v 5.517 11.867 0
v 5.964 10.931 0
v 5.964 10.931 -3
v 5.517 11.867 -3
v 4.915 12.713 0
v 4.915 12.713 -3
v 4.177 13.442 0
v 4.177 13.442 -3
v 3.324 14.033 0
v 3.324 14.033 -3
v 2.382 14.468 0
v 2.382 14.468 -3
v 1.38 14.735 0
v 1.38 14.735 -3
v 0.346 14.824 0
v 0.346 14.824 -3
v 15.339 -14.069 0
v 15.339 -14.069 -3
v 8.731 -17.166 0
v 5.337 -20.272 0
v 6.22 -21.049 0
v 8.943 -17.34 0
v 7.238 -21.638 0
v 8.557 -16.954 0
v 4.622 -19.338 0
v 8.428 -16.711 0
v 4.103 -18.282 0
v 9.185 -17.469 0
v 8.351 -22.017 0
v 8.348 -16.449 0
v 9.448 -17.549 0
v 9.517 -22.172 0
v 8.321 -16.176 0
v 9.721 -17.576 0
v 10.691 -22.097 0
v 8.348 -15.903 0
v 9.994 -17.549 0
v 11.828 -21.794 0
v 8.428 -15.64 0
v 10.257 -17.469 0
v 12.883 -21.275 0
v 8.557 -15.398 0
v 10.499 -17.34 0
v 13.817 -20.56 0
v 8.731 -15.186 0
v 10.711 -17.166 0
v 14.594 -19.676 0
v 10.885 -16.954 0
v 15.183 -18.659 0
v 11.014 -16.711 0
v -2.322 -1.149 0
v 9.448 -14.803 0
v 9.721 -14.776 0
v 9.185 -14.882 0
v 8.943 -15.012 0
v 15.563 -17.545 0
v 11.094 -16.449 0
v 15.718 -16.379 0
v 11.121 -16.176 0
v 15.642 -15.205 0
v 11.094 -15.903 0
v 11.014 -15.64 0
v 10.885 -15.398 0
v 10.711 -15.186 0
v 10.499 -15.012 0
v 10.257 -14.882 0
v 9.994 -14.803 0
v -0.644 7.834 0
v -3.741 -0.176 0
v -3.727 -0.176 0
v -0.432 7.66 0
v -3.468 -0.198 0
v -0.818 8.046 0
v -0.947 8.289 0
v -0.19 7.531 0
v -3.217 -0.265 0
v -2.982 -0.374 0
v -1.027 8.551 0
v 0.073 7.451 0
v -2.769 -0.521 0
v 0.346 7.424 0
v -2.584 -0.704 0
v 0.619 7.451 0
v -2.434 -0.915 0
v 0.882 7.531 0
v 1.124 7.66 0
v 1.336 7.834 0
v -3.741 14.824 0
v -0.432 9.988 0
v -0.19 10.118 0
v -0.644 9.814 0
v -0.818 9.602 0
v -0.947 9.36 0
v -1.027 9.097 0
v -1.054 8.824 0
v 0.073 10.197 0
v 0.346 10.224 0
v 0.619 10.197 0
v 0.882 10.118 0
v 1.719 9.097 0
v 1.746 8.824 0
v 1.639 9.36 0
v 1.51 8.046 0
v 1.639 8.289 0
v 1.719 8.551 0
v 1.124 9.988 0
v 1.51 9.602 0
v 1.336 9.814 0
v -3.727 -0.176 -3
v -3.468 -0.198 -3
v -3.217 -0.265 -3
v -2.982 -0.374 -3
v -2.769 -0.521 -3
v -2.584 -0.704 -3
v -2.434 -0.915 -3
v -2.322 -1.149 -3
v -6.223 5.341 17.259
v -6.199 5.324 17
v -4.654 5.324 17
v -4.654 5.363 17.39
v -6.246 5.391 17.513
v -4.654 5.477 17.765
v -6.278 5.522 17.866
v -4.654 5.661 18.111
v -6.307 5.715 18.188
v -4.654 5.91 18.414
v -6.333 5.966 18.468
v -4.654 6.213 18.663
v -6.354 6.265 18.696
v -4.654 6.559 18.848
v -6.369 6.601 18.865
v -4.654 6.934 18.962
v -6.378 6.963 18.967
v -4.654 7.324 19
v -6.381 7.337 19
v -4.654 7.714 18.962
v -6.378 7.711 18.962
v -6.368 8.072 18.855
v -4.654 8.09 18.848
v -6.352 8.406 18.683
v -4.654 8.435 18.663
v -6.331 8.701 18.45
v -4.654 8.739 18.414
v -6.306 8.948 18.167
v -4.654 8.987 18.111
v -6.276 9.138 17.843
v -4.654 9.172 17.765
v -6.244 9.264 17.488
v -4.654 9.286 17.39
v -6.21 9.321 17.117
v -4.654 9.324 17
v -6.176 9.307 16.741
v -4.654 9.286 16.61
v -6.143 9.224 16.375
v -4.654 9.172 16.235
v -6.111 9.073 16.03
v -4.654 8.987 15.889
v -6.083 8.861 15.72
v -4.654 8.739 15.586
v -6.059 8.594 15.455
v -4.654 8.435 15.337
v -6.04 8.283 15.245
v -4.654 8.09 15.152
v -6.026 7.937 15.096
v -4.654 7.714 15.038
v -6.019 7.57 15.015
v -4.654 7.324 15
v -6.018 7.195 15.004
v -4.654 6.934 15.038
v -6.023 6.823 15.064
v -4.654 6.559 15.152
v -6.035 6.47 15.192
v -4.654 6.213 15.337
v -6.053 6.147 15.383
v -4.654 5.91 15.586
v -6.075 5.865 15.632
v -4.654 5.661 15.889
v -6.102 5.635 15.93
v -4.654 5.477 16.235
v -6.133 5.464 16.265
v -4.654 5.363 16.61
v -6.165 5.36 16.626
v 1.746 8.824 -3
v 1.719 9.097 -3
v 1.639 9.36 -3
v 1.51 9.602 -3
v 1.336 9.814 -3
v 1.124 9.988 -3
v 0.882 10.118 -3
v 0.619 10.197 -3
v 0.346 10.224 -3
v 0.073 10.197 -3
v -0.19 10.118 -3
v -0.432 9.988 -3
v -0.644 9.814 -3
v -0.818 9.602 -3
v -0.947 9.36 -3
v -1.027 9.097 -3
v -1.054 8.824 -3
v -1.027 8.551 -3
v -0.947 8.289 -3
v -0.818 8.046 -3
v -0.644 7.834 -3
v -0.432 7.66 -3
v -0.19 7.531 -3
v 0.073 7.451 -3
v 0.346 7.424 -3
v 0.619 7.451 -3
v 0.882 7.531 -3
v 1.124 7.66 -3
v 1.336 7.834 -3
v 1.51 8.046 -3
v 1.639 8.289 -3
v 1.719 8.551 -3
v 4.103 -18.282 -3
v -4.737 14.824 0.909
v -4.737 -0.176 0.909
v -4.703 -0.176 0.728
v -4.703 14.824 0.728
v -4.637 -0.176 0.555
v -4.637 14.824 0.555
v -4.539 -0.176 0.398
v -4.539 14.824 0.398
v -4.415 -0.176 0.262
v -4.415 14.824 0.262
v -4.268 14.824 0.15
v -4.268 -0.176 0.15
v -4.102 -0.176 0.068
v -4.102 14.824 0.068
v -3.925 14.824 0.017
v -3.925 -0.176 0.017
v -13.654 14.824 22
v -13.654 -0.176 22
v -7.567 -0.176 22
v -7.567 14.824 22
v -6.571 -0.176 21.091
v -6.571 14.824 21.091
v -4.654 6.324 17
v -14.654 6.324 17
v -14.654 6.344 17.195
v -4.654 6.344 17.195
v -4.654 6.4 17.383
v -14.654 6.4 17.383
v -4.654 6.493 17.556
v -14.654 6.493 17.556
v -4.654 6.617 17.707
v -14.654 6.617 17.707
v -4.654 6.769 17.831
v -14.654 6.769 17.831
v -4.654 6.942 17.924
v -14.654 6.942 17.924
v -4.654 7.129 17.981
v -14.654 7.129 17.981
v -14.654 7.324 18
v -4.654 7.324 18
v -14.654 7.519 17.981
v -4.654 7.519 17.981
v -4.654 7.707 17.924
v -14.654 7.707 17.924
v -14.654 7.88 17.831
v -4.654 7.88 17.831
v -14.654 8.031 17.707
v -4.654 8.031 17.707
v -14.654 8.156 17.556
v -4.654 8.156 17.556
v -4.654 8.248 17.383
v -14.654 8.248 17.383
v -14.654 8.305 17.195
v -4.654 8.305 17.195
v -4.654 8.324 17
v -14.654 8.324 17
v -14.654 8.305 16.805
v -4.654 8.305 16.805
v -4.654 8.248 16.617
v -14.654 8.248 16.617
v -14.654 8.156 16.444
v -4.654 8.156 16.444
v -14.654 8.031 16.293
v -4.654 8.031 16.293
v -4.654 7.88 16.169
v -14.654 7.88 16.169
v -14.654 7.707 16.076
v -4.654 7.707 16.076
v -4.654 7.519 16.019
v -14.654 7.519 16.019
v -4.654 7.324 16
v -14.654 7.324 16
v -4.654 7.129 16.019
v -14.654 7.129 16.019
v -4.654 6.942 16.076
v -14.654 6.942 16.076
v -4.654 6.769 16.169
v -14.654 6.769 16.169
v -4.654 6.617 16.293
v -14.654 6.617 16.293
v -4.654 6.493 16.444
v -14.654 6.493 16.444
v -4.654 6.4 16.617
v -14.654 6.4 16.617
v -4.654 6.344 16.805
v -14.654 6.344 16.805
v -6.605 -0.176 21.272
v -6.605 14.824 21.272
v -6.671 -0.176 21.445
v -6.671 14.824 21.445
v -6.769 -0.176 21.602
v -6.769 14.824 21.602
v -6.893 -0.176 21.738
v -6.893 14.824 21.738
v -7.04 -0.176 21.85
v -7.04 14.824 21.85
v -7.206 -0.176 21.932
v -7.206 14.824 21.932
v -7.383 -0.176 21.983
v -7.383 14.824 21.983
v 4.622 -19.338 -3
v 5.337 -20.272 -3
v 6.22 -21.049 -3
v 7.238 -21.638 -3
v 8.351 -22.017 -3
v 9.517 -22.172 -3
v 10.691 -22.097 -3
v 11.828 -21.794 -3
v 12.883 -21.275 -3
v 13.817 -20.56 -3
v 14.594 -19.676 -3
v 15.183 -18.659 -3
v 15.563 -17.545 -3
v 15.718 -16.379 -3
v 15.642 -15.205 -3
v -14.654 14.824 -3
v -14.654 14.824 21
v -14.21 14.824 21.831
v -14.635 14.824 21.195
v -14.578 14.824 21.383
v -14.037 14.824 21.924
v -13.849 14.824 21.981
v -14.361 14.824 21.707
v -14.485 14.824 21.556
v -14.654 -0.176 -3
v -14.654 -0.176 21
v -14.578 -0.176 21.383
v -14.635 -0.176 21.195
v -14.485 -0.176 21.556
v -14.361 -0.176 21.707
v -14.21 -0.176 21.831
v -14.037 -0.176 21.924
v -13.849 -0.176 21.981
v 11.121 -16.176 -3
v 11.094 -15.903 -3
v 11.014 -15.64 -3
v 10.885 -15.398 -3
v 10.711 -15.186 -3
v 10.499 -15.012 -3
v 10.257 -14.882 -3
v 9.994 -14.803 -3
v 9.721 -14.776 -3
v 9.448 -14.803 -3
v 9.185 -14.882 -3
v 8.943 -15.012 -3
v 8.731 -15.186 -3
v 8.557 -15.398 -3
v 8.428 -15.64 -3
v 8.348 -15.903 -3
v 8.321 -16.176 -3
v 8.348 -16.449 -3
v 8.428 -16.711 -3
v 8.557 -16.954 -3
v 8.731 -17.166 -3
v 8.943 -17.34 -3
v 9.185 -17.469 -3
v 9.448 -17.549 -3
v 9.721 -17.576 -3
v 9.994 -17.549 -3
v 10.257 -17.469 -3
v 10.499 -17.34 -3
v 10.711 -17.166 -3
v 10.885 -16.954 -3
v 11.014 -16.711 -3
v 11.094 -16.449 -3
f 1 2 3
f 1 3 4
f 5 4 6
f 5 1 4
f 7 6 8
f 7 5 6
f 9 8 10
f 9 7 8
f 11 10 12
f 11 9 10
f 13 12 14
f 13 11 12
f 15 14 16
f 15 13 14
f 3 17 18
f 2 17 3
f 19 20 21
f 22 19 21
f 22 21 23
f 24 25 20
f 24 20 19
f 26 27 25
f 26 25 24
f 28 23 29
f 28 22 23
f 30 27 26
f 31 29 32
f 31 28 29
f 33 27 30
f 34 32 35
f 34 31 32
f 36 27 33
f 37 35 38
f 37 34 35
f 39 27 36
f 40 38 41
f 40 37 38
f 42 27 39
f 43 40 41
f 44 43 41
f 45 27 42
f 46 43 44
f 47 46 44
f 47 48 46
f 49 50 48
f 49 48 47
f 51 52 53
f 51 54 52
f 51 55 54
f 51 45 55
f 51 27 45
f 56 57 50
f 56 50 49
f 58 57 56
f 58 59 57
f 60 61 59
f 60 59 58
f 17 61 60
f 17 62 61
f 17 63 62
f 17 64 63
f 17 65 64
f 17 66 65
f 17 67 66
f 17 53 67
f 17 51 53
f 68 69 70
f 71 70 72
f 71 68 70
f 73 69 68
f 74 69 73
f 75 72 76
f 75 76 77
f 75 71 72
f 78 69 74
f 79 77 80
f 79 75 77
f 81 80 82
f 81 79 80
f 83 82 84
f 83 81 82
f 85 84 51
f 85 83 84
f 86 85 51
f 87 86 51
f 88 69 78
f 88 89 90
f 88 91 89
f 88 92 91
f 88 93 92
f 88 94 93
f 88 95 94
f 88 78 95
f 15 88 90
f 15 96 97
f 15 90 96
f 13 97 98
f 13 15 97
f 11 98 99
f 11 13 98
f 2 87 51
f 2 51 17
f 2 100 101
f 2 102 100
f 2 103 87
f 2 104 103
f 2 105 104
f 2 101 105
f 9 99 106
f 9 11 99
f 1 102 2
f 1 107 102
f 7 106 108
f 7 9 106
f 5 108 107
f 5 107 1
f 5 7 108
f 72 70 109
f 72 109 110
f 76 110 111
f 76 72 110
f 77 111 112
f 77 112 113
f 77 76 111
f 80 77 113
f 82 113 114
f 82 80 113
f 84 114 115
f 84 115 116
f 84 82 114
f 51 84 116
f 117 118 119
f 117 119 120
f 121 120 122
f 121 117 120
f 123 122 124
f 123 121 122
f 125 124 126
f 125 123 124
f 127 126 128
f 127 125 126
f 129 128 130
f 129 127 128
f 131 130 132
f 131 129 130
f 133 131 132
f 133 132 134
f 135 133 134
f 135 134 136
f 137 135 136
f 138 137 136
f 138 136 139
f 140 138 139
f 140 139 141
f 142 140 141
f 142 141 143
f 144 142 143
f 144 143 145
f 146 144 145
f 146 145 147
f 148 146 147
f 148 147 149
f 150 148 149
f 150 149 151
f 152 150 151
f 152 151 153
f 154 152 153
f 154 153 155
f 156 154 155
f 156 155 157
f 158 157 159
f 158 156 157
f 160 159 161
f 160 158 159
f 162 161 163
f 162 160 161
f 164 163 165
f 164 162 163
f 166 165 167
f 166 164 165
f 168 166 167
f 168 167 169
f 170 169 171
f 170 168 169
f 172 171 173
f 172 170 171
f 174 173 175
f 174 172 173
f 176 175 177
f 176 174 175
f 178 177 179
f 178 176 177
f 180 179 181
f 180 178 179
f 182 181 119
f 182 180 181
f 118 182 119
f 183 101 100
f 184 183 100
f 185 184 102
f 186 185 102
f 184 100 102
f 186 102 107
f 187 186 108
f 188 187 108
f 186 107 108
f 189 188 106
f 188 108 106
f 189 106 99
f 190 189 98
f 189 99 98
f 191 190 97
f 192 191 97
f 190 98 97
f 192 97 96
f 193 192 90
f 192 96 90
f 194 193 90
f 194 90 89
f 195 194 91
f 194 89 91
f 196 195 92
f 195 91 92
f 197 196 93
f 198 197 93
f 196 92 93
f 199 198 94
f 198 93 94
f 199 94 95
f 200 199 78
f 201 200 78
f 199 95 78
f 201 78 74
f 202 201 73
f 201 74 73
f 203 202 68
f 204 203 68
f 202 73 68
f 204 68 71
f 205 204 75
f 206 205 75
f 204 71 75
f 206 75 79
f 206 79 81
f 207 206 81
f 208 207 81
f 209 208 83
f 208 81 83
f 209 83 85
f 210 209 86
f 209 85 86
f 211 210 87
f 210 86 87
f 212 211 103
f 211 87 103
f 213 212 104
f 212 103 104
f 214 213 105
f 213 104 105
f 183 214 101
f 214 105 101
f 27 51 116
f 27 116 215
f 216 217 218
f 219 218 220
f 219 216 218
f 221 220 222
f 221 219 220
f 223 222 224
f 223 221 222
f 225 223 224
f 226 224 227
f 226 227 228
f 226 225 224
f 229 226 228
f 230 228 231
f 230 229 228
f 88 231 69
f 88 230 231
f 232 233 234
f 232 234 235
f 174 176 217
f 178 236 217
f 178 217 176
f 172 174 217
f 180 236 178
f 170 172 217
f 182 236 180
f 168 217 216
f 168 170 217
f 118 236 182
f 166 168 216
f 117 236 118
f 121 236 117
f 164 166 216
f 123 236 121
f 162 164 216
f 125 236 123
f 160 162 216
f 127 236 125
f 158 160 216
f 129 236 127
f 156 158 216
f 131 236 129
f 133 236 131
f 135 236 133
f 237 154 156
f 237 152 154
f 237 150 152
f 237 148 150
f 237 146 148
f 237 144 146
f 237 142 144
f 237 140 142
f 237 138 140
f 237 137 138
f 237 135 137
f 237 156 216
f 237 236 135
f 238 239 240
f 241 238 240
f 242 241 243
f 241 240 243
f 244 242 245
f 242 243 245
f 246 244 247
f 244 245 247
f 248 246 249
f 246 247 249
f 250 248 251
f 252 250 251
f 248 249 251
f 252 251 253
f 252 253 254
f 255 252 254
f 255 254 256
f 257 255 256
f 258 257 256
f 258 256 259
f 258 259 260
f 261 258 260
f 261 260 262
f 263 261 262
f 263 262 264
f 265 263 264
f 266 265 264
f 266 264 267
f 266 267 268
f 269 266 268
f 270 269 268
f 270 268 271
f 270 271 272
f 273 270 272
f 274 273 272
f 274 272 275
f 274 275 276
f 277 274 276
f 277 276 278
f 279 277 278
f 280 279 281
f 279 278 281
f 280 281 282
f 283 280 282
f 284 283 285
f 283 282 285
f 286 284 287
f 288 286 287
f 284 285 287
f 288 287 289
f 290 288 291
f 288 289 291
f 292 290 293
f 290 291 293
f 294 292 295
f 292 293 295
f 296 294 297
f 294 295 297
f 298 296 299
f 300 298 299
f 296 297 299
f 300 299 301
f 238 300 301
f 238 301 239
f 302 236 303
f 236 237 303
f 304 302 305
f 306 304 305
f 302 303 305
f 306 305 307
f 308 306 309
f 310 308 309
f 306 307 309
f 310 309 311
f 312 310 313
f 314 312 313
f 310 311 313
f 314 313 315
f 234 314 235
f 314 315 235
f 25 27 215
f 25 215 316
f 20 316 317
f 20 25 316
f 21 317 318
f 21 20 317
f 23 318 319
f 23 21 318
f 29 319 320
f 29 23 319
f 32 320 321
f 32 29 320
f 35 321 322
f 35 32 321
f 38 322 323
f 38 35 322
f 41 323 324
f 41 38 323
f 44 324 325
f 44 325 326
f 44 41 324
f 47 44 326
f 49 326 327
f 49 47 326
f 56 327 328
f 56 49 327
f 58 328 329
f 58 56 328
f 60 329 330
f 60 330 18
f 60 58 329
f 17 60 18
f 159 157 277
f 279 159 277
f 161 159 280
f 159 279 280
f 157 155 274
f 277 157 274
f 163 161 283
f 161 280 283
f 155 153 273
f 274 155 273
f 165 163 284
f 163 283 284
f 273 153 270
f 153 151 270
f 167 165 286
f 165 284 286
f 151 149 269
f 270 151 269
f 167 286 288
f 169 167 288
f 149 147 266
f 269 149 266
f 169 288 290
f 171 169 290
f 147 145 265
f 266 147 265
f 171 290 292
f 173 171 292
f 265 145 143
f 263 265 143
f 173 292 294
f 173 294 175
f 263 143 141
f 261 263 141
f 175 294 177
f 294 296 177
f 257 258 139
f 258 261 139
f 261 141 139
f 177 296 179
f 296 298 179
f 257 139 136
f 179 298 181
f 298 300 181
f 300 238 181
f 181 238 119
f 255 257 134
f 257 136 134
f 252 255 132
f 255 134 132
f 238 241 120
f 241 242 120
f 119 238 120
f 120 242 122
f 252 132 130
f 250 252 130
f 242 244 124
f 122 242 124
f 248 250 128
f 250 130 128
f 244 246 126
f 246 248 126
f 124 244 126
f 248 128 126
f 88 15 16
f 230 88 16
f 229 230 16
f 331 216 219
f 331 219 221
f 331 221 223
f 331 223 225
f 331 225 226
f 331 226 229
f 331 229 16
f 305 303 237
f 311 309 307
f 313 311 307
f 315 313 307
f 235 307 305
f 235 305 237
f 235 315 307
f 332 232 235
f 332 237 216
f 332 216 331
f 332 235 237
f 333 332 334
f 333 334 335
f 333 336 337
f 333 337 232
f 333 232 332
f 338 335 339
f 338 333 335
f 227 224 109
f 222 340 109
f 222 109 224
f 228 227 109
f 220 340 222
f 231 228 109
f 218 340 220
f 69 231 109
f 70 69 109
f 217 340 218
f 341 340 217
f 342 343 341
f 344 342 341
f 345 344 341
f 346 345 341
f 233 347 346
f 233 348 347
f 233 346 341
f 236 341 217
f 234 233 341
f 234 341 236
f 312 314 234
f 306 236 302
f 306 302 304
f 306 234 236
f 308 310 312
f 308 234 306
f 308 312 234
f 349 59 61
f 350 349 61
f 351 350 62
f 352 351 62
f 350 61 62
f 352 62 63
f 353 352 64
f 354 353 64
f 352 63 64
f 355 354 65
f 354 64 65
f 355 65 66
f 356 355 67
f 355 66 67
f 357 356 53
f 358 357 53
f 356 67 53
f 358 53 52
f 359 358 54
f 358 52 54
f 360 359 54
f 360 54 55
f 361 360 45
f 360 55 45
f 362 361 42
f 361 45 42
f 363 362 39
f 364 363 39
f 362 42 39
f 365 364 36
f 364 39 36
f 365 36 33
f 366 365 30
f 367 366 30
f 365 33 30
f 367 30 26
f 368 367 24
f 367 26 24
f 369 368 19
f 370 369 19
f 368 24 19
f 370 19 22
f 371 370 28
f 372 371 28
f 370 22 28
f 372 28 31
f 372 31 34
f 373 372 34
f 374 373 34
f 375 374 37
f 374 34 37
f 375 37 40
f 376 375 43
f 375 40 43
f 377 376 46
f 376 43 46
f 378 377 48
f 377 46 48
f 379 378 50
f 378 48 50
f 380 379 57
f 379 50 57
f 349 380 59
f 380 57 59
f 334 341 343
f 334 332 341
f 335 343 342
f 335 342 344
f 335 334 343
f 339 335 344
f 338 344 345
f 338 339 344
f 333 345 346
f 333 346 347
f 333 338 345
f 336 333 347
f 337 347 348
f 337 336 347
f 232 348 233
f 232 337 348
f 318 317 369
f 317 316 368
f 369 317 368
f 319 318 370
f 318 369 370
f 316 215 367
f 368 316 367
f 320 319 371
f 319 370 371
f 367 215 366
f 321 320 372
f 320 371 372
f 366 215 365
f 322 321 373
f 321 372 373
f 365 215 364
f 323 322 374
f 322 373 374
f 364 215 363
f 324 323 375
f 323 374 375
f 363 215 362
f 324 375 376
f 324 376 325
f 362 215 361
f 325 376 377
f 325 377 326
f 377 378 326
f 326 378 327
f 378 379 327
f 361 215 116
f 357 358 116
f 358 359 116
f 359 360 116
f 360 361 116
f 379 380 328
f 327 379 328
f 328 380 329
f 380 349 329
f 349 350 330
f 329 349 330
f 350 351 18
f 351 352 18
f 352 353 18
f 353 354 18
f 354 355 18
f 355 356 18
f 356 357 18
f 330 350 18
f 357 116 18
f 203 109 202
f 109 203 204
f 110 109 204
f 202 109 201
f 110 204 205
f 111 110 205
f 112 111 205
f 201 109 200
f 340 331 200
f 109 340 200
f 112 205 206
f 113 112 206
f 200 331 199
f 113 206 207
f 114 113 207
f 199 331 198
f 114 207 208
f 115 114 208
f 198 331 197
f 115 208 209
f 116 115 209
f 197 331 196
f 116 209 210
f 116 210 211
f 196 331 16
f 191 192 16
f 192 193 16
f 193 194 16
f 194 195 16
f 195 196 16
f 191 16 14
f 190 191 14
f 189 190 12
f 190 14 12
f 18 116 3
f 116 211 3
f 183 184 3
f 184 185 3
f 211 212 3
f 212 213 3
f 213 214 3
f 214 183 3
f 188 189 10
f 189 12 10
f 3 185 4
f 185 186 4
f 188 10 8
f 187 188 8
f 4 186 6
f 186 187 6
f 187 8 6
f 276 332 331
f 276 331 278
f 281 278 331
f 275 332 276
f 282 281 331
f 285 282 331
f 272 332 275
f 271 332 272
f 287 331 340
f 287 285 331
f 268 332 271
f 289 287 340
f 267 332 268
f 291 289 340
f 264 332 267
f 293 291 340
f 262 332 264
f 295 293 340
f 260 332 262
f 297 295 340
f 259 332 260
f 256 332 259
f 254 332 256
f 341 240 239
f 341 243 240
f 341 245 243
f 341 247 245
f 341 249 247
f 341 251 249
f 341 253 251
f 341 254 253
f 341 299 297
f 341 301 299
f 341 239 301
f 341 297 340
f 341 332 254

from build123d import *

# Parameters (mm, degrees)
F0_R     = 1.4
F0_W     = 10
F0_H     = 15
F3_DEPTH = 3
F2_W     = 8
F2_H     = 15
F5_R     = 2
F5_R_2   = 1
F6_DEPTH = 10
F7_DEPTH = 15
F8_R     = 1


with BuildPart() as f3:
    # F0 (on Top) → F3 (new body)
    with BuildSketch(Plane.XY):
        with BuildLine():
            Line((-2.3220218662, -1.1490219488), (4.1030128133, -18.2824477607))
            ThreePointArc((4.1030128133, -18.2824477607), (11.8277285282, -21.7936821766), (15.3389629441, -14.0689664616))
            Line((15.3389629441, -14.0689664616), (5.9639629441, 10.9310335384))
            ThreePointArc((5.9639629441, 10.9310335384), (3.7635569052, 13.7558465942), (0.3459878787, 14.8242928889))
            Line((0.3459878787, 14.8242928889), (-4.6540121213, 14.8242928889))
            Line((-4.6540121213, 14.8242928889), (-4.6540121213, -0.1757071111))
            Line((-4.6540121213, -0.1757071111), (-3.7265156326, -0.1757071111))
            ThreePointArc((-3.7265156326, -0.1757071111), (-2.8721233759, -0.4428186848), (-2.3220218662, -1.1490219488))
        make_face()
        with Locations((9.7209878787, -16.1757071111)):
            Circle(F0_R, mode=Mode.SUBTRACT)
        with Locations((0.3459878787, 8.8242928889)):
            Circle(F0_R, mode=Mode.SUBTRACT)
        with Locations((-9.6540121213, 7.3242928889)):
            Rectangle(F0_W, F0_H)
    extrude(amount=-F3_DEPTH)

    # F0 (on Top) → F4 section 0
    with BuildSketch(Plane.XY):
        with Locations((-9.6540121213, 7.3242928889)):
            Rectangle(F0_W, F0_H)
    # F2 (on offset) → F4 section 1
    with BuildSketch(Plane.XY.offset(22)):
        with Locations((-10.6540121213, 7.3242928889)):
            Rectangle(F2_W, F2_H)
    loft()

    # F5 (on face) → F6 (join)
    with BuildSketch(Plane(origin=(-14.6540121213, 0, 0), x_dir=(0, -1, 0), z_dir=(-1, 0, 0))):
        with Locations((-7.3242928889, 17)):
            Circle(F5_R)
        with Locations((-7.3242928889, 17)):
            Circle(F5_R_2, mode=Mode.SUBTRACT)
    extrude(amount=-F6_DEPTH)

    # F5 (on face) → F7 (cut)
    with BuildSketch(Plane(origin=(-14.6540121213, 0, 0), x_dir=(0, -1, 0), z_dir=(-1, 0, 0))):
        with Locations((-7.3242928889, 17)):
            Circle(F5_R_2)
    extrude(amount=-F7_DEPTH, mode=Mode.SUBTRACT)

    # F8
    f8_edges = [f3.edges().sort_by_distance(p)[0] for p in [
        (-6.654012, 7.324293, 22),
        (-4.654012, 7.324293, 0),
        (-14.654012, 7.324293, 22),
    ]]
    fillet(f8_edges, radius=F8_R)


solid = f3.part
